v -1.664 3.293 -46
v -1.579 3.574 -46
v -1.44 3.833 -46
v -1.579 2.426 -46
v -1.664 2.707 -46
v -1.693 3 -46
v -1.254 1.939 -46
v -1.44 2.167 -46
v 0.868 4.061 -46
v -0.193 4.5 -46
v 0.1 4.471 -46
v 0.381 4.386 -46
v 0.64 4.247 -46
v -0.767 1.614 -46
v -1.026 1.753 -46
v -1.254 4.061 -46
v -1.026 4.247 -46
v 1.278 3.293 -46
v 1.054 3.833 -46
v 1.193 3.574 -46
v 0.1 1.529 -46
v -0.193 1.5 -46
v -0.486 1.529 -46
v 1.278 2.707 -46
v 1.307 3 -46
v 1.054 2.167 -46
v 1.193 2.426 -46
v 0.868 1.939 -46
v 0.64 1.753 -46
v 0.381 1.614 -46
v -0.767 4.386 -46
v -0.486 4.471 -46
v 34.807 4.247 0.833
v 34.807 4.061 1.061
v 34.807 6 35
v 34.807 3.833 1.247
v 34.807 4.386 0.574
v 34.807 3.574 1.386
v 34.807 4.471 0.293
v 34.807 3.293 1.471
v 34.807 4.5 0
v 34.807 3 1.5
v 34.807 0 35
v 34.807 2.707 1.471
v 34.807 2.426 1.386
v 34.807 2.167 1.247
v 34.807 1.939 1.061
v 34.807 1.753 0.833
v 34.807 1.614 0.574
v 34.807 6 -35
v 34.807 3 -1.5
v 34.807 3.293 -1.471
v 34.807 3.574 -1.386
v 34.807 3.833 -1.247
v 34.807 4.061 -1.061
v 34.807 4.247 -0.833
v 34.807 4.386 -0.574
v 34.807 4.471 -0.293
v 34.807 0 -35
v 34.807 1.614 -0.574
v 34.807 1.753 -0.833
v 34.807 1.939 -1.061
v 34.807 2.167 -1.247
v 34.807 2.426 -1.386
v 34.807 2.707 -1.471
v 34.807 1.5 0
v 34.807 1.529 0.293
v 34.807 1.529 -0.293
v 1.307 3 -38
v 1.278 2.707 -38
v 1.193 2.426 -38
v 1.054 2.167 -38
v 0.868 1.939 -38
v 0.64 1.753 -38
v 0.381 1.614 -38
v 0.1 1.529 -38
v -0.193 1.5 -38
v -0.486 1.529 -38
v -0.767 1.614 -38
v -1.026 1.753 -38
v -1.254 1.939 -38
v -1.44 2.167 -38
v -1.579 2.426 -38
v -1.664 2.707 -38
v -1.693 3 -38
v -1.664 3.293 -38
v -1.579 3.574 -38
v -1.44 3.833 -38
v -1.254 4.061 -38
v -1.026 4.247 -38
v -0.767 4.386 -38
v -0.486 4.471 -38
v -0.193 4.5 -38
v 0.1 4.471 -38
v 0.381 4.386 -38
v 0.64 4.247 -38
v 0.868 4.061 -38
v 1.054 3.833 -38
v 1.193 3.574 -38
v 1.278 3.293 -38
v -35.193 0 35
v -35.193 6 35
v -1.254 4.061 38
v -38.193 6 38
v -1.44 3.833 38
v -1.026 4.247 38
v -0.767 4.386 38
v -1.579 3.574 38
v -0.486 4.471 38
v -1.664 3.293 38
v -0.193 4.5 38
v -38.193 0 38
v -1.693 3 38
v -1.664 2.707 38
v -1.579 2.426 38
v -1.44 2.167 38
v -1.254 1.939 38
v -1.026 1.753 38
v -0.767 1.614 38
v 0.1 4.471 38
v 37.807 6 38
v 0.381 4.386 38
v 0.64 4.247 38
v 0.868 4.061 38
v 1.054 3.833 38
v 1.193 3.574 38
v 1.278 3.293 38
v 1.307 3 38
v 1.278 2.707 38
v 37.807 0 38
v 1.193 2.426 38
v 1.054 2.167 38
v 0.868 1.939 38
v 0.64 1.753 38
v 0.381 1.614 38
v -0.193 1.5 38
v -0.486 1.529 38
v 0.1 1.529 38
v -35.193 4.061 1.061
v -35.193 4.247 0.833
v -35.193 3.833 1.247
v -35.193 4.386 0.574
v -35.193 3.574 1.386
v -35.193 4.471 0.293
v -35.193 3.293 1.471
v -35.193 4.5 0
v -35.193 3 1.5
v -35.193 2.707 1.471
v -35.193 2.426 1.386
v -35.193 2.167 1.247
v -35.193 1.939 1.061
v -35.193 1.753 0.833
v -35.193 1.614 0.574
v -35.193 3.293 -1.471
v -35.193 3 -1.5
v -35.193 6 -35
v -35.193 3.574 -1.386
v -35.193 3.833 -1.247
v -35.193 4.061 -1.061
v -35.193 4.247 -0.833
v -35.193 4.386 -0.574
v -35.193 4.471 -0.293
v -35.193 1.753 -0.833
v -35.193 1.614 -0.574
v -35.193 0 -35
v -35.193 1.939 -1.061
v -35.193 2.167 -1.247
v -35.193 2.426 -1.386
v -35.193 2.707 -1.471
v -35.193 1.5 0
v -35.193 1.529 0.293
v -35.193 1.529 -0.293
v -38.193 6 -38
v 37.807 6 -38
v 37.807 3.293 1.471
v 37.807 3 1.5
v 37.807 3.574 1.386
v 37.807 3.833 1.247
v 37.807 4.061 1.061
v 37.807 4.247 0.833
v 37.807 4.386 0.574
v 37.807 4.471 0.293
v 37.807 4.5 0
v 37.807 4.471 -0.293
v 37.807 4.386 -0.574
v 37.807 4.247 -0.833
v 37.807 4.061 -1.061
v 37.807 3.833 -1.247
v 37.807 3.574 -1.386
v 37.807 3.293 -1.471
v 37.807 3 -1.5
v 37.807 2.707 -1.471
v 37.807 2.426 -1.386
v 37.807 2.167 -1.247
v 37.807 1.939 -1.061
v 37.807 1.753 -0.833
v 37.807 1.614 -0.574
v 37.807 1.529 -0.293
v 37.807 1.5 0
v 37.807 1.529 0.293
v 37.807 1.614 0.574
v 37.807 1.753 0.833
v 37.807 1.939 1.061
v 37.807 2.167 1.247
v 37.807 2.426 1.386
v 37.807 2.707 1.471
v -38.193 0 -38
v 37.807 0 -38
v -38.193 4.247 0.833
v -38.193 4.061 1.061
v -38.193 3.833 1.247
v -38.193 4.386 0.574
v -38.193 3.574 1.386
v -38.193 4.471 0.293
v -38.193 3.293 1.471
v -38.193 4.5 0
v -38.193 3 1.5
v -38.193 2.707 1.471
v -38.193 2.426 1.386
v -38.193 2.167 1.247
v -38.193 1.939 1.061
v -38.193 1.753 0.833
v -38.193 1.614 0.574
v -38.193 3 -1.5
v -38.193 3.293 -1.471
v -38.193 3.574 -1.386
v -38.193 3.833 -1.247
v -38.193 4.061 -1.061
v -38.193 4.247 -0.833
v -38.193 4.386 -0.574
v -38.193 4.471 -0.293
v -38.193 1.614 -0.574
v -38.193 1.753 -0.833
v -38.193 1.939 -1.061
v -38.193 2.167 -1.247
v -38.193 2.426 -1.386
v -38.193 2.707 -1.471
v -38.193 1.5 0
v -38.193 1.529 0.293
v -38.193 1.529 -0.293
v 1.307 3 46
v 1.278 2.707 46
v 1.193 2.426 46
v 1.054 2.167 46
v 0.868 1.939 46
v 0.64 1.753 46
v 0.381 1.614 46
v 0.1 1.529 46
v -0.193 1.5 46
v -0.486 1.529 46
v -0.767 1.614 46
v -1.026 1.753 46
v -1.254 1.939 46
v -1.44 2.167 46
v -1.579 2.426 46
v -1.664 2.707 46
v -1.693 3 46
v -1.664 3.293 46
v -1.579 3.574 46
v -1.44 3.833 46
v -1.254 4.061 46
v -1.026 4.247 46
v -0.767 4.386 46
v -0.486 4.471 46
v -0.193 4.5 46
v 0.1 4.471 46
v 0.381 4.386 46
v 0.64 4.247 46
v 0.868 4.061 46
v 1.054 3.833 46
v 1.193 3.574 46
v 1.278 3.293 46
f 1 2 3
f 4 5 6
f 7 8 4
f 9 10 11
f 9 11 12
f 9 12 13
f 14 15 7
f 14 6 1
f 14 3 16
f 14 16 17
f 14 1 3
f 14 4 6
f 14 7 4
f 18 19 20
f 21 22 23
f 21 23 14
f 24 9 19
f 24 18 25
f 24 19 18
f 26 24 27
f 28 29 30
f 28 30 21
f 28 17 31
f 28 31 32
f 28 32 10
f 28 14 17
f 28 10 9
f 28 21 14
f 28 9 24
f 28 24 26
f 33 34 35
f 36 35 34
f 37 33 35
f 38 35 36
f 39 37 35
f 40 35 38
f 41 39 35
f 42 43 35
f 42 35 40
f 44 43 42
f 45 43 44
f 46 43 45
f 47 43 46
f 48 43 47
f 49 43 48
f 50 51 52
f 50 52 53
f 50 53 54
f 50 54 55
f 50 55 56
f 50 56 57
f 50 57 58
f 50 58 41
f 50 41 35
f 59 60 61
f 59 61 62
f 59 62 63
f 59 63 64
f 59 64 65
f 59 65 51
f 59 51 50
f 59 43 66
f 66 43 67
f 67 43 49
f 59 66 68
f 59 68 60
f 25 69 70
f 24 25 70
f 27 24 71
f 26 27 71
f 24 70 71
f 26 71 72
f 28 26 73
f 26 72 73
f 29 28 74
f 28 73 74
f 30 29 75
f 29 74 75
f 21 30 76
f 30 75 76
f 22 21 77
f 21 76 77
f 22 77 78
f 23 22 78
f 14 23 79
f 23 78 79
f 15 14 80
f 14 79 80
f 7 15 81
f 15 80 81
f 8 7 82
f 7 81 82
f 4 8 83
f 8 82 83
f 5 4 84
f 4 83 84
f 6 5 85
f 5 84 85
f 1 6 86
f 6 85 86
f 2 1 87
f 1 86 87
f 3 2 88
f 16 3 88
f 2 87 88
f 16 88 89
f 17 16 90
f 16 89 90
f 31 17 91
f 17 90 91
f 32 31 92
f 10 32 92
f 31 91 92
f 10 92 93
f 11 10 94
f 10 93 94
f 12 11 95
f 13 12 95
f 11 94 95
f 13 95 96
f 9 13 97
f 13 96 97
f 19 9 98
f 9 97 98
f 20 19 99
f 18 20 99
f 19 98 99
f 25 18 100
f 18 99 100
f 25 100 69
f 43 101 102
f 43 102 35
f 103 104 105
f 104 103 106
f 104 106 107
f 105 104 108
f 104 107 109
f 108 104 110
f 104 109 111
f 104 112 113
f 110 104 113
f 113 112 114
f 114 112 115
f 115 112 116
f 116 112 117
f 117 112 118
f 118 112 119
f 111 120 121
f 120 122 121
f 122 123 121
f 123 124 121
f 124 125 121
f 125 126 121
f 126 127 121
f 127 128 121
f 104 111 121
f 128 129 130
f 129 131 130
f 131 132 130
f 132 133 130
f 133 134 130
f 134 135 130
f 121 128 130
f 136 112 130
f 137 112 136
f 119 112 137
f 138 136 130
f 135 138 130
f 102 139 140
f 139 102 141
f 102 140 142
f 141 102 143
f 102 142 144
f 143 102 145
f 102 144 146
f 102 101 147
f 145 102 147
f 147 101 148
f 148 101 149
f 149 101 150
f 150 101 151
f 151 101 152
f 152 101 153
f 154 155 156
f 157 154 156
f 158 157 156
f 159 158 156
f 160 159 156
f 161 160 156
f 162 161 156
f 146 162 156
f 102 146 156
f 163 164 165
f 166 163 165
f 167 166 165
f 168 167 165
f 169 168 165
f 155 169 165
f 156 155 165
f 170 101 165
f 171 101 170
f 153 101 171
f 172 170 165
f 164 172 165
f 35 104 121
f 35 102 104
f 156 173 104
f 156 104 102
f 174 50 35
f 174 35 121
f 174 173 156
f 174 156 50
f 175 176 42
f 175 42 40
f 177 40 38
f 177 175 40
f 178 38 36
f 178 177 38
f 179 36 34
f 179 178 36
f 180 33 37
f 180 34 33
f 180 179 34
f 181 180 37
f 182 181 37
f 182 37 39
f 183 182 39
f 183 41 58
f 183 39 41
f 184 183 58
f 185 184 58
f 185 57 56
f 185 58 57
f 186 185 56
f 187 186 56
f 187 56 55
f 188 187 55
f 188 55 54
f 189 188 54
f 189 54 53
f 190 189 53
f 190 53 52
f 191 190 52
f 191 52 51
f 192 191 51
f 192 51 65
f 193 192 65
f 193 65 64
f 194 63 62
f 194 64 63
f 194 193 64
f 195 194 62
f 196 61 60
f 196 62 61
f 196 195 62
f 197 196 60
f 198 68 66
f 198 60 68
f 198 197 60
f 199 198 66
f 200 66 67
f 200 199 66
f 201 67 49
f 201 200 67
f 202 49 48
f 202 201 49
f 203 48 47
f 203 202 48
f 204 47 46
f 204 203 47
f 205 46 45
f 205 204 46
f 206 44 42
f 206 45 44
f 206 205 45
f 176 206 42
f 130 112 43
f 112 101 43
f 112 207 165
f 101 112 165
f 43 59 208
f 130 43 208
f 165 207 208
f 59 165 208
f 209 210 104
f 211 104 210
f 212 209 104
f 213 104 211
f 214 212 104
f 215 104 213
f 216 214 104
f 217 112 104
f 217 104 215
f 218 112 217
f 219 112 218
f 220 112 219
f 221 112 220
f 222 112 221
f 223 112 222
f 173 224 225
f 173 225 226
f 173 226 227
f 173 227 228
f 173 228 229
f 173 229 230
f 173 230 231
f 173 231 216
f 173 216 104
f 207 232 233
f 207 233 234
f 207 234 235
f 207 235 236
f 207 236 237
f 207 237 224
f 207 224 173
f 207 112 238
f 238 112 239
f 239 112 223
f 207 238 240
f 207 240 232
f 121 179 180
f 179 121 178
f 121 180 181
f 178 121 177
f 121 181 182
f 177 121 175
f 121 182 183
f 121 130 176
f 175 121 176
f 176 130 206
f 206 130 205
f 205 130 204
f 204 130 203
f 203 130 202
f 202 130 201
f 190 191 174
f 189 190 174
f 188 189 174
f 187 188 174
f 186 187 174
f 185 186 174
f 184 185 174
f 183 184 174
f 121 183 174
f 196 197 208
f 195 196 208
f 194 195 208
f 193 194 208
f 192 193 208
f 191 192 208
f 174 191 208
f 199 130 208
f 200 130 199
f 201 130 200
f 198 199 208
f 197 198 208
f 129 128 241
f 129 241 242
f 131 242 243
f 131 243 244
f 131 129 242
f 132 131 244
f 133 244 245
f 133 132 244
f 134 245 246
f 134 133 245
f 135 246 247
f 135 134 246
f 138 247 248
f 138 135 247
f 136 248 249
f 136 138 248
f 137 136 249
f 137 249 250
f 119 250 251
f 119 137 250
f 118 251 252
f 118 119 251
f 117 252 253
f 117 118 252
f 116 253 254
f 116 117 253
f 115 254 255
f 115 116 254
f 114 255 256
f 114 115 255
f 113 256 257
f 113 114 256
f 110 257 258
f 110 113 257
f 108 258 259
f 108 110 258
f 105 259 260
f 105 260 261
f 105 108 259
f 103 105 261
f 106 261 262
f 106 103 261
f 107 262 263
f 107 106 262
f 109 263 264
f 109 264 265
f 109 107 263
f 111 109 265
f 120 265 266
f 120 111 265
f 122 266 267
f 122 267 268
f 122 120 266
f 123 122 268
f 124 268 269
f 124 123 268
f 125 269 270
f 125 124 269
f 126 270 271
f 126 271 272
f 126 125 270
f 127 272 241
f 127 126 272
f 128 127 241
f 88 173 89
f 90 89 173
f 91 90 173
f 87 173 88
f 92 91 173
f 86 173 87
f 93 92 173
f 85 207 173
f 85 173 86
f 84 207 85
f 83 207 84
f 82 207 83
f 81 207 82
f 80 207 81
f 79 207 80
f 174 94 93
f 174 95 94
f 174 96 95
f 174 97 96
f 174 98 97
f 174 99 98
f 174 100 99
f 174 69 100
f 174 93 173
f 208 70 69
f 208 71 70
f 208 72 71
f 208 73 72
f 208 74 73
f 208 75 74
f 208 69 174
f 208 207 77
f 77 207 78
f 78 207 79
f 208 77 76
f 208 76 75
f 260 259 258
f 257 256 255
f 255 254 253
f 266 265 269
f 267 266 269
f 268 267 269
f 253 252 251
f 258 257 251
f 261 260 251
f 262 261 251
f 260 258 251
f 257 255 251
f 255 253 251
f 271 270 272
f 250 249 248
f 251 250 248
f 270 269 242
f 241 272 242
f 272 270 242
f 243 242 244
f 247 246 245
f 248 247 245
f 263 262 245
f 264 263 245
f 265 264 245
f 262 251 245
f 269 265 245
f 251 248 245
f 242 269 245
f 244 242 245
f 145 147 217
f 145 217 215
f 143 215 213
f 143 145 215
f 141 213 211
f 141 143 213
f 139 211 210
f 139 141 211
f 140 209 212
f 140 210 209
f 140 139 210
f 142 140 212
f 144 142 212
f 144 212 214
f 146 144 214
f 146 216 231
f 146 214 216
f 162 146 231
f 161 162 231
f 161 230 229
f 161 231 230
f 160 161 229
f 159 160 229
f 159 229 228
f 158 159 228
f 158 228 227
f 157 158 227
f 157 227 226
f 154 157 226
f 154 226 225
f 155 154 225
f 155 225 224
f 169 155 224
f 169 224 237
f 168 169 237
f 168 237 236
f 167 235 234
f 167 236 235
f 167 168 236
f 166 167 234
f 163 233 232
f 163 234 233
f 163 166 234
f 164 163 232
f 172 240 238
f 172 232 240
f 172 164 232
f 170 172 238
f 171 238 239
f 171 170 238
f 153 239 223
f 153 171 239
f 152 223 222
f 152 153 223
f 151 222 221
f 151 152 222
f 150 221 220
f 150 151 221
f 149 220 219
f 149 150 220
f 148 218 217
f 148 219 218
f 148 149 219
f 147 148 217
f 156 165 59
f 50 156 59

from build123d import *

# Parameters (mm, degrees)
SKETCH1_W               = 76
SKETCH1_H               = 76
SKETCH1_W_2             = 70
SKETCH1_H_2             = 70
EXTRUDE_THIN1_DEPTH     = 6
CUT_EXTRUDE1_DEPTH      = 83.516664984
CUT_EXTRUDE1_DEPTH_BACK = 83.516664984
SKETCH2_R               = 1.5
SKETCH3_R               = 1.5
BOSS_EXTRUDE1_DEPTH     = 8


with BuildPart() as part:
    # Sketch1 → Extrude-Thin1 (new body)
    with BuildSketch(Plane(origin=(0, 0, 0), x_dir=(1, 0, 0), z_dir=(0, 1, 0))):
        with Locations((-0.192988196, 0)):
            Rectangle(SKETCH1_W, SKETCH1_H)
        with Locations((-0.192988196, 0)):
            Rectangle(SKETCH1_W_2, SKETCH1_H_2, mode=Mode.SUBTRACT)
    extrude(amount=EXTRUDE_THIN1_DEPTH)

    # Sketch2 → Cut-Extrude1 (cut, two sides: drawn at the far end of the back side and taken through both)
    with BuildSketch(Plane.ZY.offset(-34.807011804).offset(-CUT_EXTRUDE1_DEPTH_BACK)):
        with Locations((0, 3)):
            Circle(SKETCH2_R)
    extrude(amount=CUT_EXTRUDE1_DEPTH + CUT_EXTRUDE1_DEPTH_BACK, mode=Mode.SUBTRACT)

    # Sketch3 → Boss-Extrude1 (add)
    with BuildSketch(Plane(origin=(0, 0, -38), x_dir=(-1, 0, 0), z_dir=(0, 0, -1))):
        with Locations(Location((0.192988196, 3, 0), (0, 0, 180))):
            Circle(SKETCH3_R)
    boss_extrude1 = extrude(amount=BOSS_EXTRUDE1_DEPTH)

    # Mirror1: Boss-Extrude1 across plane
    add(boss_extrude1.mirror(Plane.XY))


solid = part.part
